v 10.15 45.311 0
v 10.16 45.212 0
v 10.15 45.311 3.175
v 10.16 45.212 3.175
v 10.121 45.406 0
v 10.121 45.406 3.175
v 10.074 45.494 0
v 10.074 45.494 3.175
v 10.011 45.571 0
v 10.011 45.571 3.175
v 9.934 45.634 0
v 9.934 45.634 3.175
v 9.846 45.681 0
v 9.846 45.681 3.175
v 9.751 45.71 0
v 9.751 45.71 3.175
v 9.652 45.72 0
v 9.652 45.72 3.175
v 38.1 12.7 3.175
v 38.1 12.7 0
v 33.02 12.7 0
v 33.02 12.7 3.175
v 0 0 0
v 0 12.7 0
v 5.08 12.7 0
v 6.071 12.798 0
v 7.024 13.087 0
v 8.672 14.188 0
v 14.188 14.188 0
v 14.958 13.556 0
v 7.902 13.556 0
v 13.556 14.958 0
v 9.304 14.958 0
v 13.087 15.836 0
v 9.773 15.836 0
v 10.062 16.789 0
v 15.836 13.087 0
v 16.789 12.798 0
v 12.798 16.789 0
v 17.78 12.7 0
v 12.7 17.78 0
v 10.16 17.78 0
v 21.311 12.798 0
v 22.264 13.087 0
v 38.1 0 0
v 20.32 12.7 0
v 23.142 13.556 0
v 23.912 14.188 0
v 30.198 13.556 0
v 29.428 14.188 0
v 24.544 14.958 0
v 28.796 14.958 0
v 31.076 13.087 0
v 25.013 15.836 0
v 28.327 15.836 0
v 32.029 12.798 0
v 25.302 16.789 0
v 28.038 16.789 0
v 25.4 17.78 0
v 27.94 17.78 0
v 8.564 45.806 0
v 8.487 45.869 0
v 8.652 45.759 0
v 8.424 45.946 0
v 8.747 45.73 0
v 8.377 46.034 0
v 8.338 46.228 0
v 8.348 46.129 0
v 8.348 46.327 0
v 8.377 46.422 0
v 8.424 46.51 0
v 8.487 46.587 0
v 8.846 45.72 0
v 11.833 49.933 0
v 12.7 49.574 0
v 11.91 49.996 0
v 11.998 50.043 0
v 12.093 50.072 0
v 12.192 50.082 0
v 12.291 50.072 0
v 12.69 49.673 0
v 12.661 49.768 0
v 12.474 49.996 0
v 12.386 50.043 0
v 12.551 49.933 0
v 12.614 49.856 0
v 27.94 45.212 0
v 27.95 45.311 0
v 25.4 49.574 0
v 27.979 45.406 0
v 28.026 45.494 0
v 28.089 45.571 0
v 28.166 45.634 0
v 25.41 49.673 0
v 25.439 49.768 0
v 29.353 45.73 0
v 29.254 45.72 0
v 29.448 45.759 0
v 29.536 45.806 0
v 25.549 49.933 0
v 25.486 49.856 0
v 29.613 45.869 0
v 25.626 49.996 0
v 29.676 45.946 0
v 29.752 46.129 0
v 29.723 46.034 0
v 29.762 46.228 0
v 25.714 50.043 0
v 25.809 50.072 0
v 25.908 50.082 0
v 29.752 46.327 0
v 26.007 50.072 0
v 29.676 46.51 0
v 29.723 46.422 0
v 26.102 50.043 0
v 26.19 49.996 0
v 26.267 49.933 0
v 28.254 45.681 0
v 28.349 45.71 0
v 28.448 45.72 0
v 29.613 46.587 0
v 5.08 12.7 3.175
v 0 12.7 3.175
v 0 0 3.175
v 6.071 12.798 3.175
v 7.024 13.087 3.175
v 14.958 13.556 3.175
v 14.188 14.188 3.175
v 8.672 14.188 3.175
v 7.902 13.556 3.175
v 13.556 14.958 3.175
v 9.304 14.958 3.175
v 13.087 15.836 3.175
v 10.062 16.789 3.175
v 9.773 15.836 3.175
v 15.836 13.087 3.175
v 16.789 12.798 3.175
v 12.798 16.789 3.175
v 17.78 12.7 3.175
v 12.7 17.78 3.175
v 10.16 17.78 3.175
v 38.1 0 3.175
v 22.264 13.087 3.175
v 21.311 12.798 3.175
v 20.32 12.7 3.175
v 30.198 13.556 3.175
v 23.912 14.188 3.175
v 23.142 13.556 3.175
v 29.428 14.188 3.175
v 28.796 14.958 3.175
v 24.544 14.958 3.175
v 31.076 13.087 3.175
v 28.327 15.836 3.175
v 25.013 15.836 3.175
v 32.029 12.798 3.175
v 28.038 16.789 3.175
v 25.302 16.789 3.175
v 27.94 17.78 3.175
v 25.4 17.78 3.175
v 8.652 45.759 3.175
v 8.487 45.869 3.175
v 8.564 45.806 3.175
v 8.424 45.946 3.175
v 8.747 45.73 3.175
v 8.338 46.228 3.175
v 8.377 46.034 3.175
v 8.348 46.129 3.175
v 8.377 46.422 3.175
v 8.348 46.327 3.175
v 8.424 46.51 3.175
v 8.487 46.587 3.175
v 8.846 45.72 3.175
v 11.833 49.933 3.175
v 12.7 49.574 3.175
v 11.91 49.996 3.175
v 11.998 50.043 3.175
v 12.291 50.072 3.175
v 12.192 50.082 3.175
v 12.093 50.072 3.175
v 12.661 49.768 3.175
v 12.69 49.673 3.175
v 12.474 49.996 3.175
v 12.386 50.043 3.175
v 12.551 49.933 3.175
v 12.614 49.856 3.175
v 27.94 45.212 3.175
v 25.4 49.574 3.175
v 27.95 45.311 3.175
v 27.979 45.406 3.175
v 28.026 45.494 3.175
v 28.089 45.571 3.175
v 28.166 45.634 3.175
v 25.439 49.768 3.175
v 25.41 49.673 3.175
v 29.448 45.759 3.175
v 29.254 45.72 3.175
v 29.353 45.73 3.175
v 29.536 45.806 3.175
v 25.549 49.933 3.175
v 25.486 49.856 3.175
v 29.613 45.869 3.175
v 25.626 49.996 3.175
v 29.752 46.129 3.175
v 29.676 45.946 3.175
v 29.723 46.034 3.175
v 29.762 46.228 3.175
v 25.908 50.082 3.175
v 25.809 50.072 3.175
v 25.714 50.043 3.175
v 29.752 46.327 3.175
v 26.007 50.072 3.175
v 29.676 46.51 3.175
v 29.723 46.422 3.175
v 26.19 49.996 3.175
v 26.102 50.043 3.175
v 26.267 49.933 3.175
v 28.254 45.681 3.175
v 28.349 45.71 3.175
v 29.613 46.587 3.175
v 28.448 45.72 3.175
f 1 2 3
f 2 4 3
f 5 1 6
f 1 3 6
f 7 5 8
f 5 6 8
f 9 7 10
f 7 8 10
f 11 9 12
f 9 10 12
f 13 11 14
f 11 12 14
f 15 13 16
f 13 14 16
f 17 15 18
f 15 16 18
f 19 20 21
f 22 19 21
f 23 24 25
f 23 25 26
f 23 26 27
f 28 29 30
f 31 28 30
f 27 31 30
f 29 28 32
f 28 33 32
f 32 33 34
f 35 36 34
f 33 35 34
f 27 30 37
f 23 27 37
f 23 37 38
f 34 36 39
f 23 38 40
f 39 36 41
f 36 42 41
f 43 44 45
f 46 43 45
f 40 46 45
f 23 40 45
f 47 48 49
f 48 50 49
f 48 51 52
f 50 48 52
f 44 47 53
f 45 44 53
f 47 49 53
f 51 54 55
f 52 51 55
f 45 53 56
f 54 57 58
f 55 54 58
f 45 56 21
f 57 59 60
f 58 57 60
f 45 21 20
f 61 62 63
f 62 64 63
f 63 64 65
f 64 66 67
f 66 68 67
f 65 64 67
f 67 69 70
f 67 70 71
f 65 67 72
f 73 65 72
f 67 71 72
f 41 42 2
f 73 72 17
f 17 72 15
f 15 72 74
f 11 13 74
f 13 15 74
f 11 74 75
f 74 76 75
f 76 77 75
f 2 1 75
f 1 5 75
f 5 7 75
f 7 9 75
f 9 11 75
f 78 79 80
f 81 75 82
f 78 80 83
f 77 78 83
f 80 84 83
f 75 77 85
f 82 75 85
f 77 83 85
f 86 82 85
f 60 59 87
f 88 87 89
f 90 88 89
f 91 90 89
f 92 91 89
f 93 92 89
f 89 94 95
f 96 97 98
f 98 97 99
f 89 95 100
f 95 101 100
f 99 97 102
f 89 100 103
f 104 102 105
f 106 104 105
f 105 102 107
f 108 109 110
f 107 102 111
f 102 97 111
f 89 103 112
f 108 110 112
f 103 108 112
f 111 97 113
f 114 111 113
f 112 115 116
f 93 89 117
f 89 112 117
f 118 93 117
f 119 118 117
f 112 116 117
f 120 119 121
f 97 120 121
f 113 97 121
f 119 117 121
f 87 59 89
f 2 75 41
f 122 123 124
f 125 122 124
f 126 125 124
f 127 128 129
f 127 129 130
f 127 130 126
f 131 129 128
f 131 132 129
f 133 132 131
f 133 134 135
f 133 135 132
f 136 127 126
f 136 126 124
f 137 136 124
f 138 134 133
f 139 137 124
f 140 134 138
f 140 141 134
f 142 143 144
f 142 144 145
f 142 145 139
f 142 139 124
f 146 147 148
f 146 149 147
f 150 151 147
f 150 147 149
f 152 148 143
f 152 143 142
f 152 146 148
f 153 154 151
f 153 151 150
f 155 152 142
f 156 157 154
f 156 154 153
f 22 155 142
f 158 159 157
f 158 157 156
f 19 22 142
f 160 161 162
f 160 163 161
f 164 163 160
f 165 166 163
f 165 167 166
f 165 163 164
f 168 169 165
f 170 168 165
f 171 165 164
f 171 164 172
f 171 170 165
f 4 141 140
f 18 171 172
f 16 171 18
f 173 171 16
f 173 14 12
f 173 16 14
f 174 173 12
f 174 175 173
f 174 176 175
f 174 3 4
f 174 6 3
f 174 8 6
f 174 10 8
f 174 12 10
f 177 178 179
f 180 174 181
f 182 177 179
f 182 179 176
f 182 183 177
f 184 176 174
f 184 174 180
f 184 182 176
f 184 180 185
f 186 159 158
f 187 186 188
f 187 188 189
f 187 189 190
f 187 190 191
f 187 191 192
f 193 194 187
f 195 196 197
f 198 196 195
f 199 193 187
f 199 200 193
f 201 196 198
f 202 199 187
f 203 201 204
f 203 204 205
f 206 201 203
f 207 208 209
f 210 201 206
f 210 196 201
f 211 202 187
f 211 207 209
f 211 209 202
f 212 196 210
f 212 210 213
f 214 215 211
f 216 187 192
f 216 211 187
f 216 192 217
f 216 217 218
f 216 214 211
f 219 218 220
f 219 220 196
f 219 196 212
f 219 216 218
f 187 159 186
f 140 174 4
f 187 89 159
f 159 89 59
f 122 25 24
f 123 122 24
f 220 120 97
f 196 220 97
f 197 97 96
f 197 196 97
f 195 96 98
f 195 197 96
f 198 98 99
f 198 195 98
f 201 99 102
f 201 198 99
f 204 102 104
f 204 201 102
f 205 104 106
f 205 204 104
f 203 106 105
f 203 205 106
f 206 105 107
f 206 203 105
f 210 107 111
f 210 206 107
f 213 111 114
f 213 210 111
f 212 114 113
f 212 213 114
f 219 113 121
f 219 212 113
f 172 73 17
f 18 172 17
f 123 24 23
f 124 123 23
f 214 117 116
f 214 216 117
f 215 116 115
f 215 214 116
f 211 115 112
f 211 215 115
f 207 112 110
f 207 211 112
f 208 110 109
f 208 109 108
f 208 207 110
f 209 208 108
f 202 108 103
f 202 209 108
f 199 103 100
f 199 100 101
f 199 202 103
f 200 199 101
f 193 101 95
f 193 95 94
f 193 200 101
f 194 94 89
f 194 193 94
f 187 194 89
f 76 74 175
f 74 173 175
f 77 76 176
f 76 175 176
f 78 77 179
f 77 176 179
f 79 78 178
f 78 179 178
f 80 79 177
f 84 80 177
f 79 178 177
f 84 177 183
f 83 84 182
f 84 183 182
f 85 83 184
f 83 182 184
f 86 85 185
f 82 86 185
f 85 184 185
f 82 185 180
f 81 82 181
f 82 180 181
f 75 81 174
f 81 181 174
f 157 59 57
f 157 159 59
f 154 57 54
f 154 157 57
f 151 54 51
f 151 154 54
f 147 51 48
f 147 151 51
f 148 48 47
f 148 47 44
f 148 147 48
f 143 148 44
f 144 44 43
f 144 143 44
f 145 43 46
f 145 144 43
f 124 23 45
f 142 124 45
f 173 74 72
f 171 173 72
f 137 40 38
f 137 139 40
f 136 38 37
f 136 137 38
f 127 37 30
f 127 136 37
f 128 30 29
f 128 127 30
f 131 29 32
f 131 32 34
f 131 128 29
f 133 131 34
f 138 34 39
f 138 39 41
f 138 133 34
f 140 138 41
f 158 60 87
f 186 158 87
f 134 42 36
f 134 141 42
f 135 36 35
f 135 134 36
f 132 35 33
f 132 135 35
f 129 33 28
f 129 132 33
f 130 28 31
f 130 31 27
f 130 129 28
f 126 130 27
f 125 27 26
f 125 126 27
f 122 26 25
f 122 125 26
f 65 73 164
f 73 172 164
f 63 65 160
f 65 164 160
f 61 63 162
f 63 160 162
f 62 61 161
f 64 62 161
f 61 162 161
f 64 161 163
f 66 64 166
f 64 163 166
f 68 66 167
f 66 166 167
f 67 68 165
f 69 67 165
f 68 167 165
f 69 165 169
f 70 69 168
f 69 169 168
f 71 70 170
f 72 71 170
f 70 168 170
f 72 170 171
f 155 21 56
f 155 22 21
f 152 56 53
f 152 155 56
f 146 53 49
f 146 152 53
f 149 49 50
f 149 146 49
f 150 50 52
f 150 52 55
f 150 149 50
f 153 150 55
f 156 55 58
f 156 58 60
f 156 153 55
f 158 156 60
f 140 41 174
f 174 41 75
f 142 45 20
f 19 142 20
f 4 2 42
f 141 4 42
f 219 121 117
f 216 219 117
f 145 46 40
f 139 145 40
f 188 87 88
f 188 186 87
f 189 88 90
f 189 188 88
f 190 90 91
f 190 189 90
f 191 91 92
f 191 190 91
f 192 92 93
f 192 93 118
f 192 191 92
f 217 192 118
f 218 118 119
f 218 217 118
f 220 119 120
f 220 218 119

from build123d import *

# Parameters (mm, degrees)
F1_DEPTH = 3.175
F2_R     = 5.08
F3_R     = 0.508


with BuildPart() as f1:
    # F0 (on Top) → F1 (new body)
    with BuildSketch(Plane.XY):
        Polygon((0, 12.7), (0, 0), (38.1, 0), (38.1, 12.7), (27.94, 12.7), (27.94, 45.72), (30.48, 45.72), (25.4, 50.8), (25.4, 12.7), (12.7, 12.7), (12.7, 50.8), (7.62, 45.72), (10.16, 45.72), (10.16, 12.7), align=None)
    extrude(amount=F1_DEPTH)

    # F2
    f2_edges = [f1.edges().sort_by_distance(p)[0] for p in [
        (27.94, 12.7, 1.5875),
        (25.4, 12.7, 1.5875),
        (12.7, 12.7, 1.5875),
        (10.16, 12.7, 1.5875),
    ]]
    fillet(f2_edges, radius=F2_R)

    # F3
    f3_edges = [f1.edges().sort_by_distance(p)[0] for p in [
        (27.94, 45.72, 1.5875),
        (30.48, 45.72, 1.5875),
        (10.16, 45.72, 1.5875),
        (7.62, 45.72, 1.5875),
        (12.7, 50.8, 1.5875),
        (25.4, 50.8, 1.5875),
    ]]
    fillet(f3_edges, radius=F3_R)


solid = f1.part
